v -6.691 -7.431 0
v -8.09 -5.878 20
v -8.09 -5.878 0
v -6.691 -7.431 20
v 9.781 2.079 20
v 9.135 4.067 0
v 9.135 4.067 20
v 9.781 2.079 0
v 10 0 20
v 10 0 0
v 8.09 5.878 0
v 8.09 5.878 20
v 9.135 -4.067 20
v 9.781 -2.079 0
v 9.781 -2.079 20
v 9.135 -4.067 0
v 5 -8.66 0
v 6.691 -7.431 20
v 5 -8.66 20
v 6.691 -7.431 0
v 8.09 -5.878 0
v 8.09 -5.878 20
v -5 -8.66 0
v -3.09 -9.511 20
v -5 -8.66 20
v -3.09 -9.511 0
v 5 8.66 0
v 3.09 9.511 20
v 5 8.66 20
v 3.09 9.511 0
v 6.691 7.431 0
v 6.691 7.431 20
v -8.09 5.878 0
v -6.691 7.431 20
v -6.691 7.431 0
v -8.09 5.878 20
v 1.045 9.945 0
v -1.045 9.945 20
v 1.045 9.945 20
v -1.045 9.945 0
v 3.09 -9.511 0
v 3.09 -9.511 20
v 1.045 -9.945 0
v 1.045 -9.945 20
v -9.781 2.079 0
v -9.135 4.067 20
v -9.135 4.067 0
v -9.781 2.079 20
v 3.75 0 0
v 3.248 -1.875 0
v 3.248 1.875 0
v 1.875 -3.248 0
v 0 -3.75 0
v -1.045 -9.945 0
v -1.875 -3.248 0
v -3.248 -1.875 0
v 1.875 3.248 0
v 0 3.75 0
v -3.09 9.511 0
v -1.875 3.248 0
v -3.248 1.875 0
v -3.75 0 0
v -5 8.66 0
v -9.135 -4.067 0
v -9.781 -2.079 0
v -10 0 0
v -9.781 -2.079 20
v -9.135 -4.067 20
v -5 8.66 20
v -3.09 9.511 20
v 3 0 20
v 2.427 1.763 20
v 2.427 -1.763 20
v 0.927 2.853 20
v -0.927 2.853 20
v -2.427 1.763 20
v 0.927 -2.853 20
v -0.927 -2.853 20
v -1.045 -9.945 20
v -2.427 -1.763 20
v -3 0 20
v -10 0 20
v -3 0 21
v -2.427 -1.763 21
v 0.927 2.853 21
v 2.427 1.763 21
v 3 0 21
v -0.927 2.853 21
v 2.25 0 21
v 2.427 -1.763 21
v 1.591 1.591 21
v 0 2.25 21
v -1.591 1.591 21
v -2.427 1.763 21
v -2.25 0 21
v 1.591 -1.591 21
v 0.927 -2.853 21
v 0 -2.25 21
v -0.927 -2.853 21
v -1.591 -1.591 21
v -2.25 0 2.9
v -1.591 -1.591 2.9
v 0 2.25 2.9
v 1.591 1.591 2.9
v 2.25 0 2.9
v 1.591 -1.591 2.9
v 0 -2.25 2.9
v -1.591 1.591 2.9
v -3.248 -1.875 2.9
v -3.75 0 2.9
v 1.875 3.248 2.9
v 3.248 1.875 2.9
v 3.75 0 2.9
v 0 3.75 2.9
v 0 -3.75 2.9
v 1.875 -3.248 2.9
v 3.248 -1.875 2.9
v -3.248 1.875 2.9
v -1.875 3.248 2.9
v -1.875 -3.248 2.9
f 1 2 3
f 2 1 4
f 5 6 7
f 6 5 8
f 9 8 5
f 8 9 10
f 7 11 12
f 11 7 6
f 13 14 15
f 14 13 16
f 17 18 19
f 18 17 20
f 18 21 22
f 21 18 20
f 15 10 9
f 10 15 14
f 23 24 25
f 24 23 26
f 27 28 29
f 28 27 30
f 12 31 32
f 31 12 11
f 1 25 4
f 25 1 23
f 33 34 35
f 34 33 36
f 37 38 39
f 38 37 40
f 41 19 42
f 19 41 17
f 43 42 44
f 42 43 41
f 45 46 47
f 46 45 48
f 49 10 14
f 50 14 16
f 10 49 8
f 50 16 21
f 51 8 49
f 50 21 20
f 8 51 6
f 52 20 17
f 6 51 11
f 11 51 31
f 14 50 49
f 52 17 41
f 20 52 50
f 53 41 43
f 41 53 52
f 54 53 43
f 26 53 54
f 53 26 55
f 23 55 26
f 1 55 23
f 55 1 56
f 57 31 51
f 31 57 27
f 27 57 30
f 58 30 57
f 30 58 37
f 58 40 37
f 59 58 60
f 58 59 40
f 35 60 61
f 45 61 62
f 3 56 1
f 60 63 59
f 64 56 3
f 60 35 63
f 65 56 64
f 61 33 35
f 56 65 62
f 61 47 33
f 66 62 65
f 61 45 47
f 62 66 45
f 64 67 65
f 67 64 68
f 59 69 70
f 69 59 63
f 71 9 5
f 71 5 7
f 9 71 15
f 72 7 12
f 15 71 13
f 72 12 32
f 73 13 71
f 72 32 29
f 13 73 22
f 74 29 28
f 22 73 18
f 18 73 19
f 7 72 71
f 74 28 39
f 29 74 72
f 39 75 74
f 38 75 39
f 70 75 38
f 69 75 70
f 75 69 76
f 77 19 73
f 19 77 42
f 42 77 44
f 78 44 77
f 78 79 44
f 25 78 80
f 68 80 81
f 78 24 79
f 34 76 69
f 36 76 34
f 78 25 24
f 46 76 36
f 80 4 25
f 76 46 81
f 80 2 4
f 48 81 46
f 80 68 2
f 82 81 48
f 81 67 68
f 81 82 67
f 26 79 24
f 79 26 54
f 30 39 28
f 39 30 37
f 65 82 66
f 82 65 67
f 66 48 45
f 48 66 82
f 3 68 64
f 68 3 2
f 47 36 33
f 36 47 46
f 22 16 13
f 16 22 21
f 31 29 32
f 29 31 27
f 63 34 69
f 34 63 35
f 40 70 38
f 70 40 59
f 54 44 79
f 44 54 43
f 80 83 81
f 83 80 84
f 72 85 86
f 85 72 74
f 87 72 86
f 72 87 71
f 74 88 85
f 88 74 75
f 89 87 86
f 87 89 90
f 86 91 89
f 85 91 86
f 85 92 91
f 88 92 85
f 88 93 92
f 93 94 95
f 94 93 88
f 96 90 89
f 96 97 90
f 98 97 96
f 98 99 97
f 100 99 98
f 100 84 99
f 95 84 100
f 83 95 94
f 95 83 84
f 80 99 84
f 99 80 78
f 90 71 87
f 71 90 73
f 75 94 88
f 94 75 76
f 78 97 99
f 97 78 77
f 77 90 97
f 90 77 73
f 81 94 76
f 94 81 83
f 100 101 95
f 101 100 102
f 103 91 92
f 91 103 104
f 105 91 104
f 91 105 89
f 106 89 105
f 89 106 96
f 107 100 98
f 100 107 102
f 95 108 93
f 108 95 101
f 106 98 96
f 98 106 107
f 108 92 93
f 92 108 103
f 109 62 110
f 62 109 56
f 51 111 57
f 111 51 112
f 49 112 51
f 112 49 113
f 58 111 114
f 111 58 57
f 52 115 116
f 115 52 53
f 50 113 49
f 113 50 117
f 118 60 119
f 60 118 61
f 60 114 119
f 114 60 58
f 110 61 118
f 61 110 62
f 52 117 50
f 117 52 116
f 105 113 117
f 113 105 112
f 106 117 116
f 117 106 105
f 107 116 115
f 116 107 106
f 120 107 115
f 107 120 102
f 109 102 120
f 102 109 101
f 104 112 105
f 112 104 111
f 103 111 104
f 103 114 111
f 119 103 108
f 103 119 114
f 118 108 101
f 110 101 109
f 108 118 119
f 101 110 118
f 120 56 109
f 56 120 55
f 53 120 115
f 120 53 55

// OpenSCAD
hole_size=6;
screw_size=4.5;
screw_depth=20;
height=20;
raise_height=1; //height of material the foot is screwed to
raise_diameter=6;
top_diameter=20;
bottom_diameter=20;
screw_hole_diameter=4.5; //this should be slightly less than the screw diameter
difference(){
    union(){
        cylinder(d2=top_diameter,d1=bottom_diameter,h=height);
        translate([0,0,height-screw_depth])cylinder(d=raise_diameter,h=screw_depth+raise_height);
    }
    translate([0,0,height-screw_depth])cylinder(d=screw_hole_diameter,h=screw_depth+raise_height+0.1);
    if (screw_depth==height) translate([0,0,-0.1])cylinder(d=screw_hole_diameter+3,h=3);
}
